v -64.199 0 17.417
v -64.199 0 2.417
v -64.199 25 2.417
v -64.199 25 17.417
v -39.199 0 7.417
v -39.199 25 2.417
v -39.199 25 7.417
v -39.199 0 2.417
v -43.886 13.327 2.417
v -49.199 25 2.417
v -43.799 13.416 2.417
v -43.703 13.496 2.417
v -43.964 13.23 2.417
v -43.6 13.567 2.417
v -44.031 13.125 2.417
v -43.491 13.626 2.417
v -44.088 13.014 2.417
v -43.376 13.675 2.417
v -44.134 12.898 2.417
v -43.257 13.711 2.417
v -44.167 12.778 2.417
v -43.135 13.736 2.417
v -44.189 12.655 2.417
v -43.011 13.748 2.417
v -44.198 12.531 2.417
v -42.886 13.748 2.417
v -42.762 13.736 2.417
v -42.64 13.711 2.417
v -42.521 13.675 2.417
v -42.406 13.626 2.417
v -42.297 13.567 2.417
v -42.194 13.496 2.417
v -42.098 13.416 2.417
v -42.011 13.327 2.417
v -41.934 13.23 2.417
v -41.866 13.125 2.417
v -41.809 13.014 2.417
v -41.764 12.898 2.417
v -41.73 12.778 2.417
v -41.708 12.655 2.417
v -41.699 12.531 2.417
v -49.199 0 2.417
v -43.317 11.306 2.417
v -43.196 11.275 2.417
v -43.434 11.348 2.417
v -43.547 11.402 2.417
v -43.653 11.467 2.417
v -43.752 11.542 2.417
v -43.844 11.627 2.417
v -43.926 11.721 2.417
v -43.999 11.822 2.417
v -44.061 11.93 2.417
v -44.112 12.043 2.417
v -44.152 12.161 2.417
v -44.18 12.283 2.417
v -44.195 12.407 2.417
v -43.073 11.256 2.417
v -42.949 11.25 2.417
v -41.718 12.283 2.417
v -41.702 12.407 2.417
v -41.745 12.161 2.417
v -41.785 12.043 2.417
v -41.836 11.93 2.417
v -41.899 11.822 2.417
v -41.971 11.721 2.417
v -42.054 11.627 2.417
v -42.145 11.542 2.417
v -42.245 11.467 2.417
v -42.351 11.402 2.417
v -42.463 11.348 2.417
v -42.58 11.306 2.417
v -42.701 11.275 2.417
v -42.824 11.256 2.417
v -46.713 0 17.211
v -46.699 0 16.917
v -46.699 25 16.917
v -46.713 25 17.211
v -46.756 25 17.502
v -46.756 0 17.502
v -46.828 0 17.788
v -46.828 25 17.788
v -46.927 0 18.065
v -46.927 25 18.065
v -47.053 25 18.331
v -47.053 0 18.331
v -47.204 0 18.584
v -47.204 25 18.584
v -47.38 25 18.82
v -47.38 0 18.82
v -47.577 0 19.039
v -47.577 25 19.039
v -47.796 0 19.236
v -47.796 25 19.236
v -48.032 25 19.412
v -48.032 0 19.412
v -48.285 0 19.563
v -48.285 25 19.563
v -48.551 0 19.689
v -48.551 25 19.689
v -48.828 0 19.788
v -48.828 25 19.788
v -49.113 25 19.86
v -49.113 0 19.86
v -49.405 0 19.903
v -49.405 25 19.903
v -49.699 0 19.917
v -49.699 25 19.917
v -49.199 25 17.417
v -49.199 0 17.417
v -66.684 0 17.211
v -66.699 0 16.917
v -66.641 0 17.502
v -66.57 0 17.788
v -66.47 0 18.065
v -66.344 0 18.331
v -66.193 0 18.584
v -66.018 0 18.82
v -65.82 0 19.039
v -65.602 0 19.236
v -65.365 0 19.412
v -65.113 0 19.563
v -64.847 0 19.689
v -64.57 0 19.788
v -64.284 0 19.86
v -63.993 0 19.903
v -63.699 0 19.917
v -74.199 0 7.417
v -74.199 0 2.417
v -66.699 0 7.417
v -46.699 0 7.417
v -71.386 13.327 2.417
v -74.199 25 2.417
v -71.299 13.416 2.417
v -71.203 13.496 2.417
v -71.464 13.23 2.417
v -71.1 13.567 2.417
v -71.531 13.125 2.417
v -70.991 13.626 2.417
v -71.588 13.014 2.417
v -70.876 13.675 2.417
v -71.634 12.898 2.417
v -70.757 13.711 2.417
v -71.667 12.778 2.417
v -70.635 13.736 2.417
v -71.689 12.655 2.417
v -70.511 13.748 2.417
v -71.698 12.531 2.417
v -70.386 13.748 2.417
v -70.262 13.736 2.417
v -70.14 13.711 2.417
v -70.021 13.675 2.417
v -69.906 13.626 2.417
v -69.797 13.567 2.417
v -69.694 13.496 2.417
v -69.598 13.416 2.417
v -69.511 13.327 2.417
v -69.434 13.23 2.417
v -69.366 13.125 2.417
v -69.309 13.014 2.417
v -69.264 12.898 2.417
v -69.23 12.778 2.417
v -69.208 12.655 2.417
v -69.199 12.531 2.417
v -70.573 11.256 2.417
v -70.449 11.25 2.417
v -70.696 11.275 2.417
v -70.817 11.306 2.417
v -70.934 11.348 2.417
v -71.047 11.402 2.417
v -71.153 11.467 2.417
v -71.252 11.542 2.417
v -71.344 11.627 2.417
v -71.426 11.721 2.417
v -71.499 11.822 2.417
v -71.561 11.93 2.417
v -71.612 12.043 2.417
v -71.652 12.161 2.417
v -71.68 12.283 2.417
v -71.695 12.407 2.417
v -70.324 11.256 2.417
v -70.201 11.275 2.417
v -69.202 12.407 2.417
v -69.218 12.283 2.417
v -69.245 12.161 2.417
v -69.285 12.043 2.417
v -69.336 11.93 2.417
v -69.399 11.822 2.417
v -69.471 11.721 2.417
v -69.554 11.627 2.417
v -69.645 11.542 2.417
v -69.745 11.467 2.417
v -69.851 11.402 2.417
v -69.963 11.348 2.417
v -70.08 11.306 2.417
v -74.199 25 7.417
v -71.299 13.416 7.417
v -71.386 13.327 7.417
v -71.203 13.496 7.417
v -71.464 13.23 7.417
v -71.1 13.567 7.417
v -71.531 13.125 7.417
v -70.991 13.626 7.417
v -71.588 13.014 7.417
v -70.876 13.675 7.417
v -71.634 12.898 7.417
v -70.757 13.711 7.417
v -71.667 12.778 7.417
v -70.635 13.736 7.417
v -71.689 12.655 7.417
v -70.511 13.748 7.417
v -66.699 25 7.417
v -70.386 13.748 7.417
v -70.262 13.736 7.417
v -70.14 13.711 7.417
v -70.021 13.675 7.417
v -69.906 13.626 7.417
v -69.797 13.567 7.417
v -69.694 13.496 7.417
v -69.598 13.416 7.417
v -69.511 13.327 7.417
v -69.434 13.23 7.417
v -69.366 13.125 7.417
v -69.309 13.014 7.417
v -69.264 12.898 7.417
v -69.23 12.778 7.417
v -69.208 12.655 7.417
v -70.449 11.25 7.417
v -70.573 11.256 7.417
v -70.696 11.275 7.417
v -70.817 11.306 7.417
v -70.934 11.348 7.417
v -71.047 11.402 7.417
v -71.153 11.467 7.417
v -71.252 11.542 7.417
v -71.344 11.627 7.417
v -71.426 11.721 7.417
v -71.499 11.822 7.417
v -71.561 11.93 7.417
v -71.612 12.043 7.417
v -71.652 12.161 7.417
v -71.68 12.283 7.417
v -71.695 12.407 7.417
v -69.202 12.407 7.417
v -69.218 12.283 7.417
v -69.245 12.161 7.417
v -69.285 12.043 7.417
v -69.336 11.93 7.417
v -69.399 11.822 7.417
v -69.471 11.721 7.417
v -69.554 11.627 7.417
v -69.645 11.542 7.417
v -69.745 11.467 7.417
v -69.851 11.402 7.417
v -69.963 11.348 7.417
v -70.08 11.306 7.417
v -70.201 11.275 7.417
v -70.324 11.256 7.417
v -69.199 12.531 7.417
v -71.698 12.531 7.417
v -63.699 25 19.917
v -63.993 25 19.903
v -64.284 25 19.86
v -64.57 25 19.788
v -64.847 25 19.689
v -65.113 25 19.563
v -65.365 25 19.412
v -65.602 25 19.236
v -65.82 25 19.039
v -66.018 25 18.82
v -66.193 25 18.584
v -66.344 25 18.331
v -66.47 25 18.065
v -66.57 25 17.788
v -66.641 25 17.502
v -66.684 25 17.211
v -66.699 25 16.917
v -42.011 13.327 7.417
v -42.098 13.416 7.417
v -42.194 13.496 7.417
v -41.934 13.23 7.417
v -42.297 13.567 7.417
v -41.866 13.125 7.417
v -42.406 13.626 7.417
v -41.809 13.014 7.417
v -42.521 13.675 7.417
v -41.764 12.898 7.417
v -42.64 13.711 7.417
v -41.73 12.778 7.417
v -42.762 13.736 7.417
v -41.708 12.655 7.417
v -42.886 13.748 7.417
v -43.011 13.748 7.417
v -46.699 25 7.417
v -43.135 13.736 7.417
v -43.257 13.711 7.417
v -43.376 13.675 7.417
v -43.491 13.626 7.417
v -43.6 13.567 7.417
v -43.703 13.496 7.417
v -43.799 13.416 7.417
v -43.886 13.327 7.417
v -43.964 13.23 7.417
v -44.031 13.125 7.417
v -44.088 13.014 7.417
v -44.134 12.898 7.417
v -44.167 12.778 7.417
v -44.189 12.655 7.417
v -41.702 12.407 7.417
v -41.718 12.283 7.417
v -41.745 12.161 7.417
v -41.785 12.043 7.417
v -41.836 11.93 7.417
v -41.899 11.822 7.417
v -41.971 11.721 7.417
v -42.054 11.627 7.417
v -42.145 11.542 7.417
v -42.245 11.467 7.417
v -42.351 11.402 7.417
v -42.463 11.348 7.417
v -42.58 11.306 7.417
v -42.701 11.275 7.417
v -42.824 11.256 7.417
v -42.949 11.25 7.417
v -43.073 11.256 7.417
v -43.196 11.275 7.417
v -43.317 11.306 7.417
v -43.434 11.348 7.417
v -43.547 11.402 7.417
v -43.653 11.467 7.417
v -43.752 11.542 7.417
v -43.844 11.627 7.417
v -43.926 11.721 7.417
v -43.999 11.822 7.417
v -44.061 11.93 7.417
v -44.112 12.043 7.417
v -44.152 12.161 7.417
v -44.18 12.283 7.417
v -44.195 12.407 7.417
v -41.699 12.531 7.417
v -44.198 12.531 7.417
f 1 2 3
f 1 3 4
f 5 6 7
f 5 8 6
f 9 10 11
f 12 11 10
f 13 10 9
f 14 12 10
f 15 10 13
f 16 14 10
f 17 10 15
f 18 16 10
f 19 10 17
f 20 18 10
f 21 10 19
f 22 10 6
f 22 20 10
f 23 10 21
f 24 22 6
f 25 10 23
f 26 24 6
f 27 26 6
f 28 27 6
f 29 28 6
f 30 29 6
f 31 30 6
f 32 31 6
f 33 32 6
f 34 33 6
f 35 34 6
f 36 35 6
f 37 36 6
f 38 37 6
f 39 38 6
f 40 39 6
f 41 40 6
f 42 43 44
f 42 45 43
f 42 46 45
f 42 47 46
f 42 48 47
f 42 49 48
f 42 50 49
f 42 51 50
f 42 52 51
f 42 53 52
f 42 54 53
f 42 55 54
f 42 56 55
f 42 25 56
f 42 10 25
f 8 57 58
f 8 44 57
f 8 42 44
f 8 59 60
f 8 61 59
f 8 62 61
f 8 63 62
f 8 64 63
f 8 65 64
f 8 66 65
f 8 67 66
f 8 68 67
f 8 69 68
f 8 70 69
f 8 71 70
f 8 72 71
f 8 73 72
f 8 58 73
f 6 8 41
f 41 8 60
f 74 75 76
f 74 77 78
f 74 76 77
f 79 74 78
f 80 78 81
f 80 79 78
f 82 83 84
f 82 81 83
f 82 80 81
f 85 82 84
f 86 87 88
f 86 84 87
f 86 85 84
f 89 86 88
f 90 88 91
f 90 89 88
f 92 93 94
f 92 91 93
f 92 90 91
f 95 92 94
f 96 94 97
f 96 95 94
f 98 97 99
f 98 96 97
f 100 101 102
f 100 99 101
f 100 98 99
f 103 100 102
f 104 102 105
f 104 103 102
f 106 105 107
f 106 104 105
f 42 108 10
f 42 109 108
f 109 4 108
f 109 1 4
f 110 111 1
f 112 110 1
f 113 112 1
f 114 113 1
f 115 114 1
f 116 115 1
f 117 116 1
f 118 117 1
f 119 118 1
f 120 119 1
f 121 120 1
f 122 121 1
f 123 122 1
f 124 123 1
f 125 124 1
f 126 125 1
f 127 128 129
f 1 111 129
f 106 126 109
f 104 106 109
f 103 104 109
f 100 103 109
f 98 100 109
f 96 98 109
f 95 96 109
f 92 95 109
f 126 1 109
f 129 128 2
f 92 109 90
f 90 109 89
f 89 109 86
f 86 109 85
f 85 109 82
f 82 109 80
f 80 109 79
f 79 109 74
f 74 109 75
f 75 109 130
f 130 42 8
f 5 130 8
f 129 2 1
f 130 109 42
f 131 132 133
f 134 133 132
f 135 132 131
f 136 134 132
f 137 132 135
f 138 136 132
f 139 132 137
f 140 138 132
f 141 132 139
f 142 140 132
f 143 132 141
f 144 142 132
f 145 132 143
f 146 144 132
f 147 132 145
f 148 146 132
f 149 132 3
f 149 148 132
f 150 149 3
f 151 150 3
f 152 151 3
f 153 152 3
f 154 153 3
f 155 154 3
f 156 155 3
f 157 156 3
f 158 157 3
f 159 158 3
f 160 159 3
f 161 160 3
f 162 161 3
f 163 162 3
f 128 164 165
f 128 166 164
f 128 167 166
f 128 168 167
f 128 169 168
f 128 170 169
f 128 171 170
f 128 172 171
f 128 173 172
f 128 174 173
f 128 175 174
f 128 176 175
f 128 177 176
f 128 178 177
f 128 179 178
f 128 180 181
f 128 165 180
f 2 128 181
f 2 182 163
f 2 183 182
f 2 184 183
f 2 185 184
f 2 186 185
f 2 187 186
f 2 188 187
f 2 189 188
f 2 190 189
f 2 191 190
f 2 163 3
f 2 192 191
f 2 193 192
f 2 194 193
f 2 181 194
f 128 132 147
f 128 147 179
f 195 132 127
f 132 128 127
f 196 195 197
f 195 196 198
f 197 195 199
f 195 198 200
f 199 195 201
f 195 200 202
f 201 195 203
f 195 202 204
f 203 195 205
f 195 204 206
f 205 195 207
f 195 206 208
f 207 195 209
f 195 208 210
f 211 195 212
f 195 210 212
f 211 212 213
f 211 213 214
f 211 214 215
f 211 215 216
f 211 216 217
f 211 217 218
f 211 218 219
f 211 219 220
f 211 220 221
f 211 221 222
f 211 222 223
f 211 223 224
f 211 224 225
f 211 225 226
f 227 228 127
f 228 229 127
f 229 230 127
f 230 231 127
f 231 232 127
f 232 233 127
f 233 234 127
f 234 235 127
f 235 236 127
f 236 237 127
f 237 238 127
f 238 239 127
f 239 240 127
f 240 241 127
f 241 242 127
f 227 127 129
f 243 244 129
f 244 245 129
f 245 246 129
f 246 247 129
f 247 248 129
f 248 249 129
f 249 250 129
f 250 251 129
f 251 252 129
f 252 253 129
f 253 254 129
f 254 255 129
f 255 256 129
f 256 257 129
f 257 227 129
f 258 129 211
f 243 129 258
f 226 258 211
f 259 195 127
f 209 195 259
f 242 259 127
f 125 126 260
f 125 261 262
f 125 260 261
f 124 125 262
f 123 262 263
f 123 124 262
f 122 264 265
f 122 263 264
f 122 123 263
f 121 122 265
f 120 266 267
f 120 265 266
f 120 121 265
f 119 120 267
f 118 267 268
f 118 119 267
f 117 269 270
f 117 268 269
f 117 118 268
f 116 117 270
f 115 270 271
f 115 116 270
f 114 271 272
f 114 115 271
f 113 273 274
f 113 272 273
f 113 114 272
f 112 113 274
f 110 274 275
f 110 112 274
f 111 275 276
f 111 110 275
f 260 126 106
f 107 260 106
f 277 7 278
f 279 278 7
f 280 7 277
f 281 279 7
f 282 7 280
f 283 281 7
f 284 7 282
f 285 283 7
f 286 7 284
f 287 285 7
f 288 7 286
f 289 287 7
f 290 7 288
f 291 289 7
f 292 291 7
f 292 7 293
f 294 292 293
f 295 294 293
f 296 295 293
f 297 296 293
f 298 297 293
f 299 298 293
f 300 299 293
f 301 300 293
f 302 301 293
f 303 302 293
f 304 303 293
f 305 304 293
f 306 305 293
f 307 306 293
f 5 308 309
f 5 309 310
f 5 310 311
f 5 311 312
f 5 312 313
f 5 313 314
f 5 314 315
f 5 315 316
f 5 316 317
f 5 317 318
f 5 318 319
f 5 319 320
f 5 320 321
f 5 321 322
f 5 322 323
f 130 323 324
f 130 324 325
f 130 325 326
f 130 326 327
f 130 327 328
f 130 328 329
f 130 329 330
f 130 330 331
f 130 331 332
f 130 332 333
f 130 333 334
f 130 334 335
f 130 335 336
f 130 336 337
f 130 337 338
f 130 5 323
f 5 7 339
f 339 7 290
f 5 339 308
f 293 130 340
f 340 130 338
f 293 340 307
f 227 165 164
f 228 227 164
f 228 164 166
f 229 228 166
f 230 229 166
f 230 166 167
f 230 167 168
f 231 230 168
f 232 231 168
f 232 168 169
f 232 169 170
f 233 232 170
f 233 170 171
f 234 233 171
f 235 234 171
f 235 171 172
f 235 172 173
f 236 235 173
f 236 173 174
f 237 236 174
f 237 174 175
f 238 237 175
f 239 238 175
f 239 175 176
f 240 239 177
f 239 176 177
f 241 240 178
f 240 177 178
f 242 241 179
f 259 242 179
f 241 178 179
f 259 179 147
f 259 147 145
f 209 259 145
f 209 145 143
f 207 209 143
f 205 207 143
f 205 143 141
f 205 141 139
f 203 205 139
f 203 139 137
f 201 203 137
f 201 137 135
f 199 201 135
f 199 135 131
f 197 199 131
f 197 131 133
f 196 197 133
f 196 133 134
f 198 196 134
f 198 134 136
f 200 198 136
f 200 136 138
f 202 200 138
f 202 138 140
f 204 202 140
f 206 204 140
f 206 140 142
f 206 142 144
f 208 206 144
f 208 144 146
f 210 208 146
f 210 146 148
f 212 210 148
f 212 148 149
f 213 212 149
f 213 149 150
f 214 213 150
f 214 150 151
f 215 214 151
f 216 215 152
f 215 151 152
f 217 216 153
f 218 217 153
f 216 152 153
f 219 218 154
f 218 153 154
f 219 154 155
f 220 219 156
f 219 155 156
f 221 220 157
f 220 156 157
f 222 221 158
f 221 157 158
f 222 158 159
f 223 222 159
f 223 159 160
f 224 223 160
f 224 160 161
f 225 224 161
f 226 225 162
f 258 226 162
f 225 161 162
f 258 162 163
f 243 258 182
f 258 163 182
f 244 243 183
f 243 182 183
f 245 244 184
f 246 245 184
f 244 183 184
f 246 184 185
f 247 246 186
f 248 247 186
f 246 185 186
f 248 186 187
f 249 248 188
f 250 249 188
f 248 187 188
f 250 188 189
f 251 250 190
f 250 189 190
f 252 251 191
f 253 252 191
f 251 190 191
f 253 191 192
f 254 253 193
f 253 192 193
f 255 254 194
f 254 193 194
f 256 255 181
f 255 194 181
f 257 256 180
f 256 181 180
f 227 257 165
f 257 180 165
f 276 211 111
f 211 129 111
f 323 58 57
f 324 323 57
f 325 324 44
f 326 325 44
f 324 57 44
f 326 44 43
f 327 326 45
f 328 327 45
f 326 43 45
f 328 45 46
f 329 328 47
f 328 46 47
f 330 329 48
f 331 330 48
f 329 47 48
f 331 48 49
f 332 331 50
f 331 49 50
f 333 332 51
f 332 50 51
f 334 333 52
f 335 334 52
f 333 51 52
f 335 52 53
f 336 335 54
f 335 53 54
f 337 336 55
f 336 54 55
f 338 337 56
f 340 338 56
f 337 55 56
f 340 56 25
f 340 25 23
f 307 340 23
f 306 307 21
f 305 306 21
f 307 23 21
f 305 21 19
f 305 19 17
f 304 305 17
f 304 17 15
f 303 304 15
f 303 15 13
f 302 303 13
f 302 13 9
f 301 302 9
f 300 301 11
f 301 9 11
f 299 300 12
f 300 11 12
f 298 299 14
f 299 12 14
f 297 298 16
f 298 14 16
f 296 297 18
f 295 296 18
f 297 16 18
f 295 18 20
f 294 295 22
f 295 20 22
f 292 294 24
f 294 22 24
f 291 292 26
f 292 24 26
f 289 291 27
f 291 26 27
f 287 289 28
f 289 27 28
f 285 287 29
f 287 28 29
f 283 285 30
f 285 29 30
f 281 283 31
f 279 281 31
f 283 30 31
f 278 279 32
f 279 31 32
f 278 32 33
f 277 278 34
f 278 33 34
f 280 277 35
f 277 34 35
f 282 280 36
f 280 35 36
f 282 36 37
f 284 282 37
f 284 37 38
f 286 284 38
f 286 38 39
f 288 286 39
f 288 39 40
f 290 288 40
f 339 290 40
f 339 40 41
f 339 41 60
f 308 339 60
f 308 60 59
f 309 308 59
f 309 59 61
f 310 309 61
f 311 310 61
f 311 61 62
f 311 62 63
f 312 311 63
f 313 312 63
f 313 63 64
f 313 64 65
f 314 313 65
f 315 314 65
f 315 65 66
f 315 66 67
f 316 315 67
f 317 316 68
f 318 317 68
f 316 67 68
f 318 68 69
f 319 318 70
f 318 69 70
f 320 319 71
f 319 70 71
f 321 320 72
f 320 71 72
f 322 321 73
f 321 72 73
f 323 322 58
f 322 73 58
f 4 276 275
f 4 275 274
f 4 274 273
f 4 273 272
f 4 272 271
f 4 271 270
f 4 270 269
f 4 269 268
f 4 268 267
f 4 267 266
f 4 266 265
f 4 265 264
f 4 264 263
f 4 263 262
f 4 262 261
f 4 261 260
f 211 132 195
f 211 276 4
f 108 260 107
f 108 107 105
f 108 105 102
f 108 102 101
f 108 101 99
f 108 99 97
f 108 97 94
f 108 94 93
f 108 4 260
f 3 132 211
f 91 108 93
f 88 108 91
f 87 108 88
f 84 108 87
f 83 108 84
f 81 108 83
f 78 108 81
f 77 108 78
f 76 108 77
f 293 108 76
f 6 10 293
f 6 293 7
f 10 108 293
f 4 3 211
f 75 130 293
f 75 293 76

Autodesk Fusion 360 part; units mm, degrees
sketch "Esboço1" plane through (0, 0, 0) normal (0, 1, 0) x (1, 0, 0)
  line L0 (-74.1987, -2.4172) -> (-64.1987, -2.4172)
  line L1 (-64.1987, -2.4172) -> (-64.1987, -17.4172)
  line L2 (-64.1987, -17.4172) -> (-49.1987, -17.4172)
  line L3 (-49.1987, -17.4172) -> (-49.1987, -1)
  line L4 (-49.1987, -1) -> (-49.1987, -2.4172)
  line L5 (-49.1987, -2.4172) -> (-39.1987, -2.4172)
  line L6 (-39.1987, -2.4172) -> (-39.1987, -7.4172)
  line L7 (-74.1987, -2.4172) -> (-74.1987, -7.4172)
  line L8 (-74.1987, -7.4172) -> (-66.6987, -7.4172)
  line L9 (-66.6987, -7.4172) -> (-66.6987, -16.9172)
  line L10 (-39.1987, -7.4172) -> (-46.6987, -7.4172)
  line L11 (-46.6987, -7.4172) -> (-46.6987, -16.9172)
  line L12 (-63.6987, -19.9172) -> (-49.6987, -19.9172)
  arc A0 (-66.6987, -16.9172) -> (-63.6987, -19.9172) centre (-63.6987, -16.9172) ccw
  arc A1 (-49.6987, -19.9172) -> (-46.6987, -16.9172) centre (-49.6987, -16.9172) ccw
  point P0 (-66.6987, -19.9172)
  point P1 (-46.6987, -19.9172)
  dimension "d1" = 10
  dimension "d2" = 15
  dimension "d3" = 15
  dimension "d4" = 10
  dimension "d5" = 5
  dimension "d6" = 5
  dimension "d7" = 7.5
  dimension "d8" = 12.5
  dimension "d9" = 7.5
  dimension "d10" = 12.5
  dimension "d11" = 3
extrude "Extrusão1" add sketch "Esboço1" along normal blind 25
sketch "Esboço2" plane through (0, 0, 0) normal (0, 0, 1) x (1, 0, 0)
hole "Furo1" at (-70.4487, 12.5, 7.4172) direction (0, 0, -1) diameter 2.5 depth 9 tip angle 118
hole "Furo2" at (-42.9487, 12.5, 7.4172) direction (0, 0, -1) diameter 2.5 depth 9 tip angle 118
